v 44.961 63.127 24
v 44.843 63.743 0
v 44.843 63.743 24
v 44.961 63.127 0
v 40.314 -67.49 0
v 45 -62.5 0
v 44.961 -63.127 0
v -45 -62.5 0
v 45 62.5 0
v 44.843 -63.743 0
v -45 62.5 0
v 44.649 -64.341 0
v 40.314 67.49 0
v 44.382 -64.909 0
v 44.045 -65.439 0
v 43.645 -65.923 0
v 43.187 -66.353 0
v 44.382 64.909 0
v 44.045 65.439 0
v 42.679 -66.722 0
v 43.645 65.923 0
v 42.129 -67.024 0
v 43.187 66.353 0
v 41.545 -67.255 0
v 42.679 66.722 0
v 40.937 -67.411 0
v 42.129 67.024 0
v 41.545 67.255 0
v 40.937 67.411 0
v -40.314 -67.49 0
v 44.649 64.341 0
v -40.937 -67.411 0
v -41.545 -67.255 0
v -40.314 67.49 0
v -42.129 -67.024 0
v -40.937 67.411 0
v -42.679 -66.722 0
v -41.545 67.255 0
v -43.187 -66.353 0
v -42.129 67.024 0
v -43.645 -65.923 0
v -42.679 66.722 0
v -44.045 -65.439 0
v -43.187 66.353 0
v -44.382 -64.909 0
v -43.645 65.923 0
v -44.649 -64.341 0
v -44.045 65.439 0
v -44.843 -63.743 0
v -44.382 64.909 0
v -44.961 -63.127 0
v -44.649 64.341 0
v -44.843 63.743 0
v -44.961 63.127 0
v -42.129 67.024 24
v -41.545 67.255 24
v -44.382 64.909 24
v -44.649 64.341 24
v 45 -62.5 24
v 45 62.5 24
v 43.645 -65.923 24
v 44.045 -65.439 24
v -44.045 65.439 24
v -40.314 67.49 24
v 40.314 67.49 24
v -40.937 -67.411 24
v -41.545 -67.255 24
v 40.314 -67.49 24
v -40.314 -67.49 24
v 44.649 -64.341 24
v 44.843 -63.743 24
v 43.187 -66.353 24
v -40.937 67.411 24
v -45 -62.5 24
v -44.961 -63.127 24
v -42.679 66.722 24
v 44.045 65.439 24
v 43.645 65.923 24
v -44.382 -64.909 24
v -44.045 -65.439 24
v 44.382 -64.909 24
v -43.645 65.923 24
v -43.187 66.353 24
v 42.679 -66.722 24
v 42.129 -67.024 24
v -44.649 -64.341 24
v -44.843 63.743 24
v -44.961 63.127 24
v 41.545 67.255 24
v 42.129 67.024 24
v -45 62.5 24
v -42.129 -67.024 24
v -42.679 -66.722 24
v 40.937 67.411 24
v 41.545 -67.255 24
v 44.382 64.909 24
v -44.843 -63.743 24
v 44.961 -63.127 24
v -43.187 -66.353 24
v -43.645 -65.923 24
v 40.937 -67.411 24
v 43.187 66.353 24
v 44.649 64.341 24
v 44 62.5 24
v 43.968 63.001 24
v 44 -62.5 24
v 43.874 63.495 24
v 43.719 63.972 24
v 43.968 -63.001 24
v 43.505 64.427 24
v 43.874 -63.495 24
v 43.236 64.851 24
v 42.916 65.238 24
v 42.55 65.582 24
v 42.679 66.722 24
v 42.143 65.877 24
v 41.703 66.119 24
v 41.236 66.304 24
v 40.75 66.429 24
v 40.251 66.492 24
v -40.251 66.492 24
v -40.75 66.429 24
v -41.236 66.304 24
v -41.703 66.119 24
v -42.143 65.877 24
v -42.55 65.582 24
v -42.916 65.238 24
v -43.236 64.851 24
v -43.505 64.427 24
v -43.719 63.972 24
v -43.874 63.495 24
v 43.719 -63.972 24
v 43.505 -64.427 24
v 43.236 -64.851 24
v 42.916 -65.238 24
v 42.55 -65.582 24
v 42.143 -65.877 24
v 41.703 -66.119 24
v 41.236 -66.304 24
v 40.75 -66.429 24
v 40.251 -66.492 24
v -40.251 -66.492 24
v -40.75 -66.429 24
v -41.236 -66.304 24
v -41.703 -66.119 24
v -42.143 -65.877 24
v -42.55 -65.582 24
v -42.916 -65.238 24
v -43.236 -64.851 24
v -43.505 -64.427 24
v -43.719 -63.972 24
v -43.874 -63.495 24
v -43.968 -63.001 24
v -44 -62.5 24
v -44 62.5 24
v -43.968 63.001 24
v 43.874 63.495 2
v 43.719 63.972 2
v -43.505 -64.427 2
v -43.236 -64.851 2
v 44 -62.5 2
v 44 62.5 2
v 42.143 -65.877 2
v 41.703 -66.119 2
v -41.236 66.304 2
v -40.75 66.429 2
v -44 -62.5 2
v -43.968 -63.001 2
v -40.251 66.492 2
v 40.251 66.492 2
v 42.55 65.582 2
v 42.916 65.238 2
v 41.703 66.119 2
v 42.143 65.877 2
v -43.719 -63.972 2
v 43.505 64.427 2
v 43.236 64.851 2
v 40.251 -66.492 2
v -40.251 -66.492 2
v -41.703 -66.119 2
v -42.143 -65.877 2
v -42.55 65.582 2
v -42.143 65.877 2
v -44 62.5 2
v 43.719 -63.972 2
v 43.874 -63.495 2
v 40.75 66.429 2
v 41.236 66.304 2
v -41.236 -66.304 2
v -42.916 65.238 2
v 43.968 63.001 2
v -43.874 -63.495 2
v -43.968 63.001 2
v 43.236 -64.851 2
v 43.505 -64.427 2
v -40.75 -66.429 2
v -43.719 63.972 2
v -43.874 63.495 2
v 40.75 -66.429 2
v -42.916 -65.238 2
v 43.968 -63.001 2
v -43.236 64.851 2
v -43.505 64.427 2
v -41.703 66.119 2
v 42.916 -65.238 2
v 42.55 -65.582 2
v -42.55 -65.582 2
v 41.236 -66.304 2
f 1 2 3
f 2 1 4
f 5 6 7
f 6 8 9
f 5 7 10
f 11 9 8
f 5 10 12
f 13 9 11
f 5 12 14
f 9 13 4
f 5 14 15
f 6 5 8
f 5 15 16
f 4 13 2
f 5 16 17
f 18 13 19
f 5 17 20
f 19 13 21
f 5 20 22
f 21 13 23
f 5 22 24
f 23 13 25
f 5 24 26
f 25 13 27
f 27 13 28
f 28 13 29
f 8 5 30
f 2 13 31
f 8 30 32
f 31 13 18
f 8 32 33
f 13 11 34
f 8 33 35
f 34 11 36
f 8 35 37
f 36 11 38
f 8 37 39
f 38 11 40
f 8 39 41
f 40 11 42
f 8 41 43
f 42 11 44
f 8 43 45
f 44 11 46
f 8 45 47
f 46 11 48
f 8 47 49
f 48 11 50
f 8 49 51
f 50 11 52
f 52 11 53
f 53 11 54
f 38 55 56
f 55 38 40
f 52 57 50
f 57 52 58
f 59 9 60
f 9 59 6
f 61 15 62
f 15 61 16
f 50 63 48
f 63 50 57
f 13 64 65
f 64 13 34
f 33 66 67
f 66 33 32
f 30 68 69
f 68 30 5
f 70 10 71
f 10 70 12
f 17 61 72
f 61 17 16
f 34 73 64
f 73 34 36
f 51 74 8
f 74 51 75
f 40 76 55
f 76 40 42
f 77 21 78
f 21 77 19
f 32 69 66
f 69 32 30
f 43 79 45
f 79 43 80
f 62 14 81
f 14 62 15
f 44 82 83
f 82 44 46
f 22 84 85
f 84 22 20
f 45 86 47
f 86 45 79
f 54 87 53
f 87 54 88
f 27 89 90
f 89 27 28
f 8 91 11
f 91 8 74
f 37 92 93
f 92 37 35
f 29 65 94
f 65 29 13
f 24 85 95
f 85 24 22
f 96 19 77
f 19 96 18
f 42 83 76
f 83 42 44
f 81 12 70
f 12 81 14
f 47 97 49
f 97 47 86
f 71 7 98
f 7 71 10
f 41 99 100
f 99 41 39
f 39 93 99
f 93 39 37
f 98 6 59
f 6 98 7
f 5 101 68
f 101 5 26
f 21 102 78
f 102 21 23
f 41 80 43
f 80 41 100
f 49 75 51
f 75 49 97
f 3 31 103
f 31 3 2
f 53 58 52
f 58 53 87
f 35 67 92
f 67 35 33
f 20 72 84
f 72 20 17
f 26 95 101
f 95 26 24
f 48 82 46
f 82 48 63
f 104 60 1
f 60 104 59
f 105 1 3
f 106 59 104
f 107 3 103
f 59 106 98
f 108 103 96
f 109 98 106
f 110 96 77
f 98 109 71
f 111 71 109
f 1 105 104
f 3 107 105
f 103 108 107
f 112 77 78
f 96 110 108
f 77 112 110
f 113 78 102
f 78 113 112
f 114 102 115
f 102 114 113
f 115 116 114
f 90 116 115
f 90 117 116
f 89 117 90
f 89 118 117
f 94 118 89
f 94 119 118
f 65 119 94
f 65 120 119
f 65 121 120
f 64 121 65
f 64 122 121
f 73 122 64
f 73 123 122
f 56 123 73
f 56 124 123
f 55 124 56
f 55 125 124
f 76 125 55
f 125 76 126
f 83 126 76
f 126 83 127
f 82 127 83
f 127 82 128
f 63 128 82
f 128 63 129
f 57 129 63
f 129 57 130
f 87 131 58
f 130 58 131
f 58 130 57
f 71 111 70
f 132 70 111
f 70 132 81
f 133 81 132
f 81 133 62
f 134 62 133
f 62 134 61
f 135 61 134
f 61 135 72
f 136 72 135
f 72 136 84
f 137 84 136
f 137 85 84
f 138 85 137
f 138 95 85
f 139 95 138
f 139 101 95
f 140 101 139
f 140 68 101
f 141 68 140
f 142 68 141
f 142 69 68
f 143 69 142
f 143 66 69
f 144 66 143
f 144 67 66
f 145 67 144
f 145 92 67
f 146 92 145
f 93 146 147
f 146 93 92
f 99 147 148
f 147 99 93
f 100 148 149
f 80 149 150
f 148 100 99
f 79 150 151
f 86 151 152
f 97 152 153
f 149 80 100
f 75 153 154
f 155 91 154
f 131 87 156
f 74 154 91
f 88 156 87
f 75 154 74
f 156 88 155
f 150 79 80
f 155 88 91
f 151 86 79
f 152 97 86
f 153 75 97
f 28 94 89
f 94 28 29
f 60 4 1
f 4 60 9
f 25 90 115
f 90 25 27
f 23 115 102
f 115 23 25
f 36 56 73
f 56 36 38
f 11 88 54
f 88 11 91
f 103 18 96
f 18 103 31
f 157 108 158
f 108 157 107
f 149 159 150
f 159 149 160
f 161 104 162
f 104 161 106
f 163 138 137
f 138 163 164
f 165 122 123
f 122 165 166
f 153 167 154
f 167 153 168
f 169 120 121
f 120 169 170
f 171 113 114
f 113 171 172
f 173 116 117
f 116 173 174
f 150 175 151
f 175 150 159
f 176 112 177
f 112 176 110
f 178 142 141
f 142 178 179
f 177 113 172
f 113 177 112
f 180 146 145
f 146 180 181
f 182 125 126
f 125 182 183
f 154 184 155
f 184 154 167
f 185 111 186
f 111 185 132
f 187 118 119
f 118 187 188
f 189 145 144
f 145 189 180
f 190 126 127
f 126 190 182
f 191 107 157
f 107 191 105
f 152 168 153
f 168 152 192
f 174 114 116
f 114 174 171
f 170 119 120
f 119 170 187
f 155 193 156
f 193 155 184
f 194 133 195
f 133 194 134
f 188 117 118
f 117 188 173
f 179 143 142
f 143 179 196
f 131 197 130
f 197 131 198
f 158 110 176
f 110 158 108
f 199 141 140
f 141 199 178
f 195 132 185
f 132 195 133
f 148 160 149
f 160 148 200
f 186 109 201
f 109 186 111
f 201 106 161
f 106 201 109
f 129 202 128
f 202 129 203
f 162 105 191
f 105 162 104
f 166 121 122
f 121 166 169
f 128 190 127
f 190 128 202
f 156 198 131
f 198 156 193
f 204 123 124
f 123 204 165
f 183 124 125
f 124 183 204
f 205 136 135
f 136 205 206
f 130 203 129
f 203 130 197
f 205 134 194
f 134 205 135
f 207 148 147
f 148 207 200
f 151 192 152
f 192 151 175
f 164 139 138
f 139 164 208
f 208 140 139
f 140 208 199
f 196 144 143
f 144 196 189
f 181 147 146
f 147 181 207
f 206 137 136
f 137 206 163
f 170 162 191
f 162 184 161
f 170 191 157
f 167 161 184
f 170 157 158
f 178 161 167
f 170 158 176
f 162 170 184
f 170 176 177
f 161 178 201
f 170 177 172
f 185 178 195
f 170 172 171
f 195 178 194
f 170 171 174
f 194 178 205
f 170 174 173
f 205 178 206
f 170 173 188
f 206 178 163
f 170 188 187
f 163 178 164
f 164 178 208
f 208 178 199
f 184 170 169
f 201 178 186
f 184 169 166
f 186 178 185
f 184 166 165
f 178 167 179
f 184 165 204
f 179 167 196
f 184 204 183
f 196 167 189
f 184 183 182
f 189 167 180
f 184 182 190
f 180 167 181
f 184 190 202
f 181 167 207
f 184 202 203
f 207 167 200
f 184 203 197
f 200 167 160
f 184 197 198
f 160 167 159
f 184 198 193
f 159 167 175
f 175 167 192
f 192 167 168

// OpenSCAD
$fn = 50;


difference() {
	union() {
		hull() {
			translate(v = [-40.0000000000, 62.5000000000, 0]) {
				cylinder(h = 24, r = 5);
			}
			translate(v = [40.0000000000, 62.5000000000, 0]) {
				cylinder(h = 24, r = 5);
			}
			translate(v = [-40.0000000000, -62.5000000000, 0]) {
				cylinder(h = 24, r = 5);
			}
			translate(v = [40.0000000000, -62.5000000000, 0]) {
				cylinder(h = 24, r = 5);
			}
		}
	}
	union() {
		translate(v = [0, 0, 2]) {
			hull() {
				translate(v = [-40.0000000000, 62.5000000000, 0]) {
					cylinder(h = 22, r = 4);
				}
				translate(v = [40.0000000000, 62.5000000000, 0]) {
					cylinder(h = 22, r = 4);
				}
				translate(v = [-40.0000000000, -62.5000000000, 0]) {
					cylinder(h = 22, r = 4);
				}
				translate(v = [40.0000000000, -62.5000000000, 0]) {
					cylinder(h = 22, r = 4);
				}
			}
		}
	}
}
